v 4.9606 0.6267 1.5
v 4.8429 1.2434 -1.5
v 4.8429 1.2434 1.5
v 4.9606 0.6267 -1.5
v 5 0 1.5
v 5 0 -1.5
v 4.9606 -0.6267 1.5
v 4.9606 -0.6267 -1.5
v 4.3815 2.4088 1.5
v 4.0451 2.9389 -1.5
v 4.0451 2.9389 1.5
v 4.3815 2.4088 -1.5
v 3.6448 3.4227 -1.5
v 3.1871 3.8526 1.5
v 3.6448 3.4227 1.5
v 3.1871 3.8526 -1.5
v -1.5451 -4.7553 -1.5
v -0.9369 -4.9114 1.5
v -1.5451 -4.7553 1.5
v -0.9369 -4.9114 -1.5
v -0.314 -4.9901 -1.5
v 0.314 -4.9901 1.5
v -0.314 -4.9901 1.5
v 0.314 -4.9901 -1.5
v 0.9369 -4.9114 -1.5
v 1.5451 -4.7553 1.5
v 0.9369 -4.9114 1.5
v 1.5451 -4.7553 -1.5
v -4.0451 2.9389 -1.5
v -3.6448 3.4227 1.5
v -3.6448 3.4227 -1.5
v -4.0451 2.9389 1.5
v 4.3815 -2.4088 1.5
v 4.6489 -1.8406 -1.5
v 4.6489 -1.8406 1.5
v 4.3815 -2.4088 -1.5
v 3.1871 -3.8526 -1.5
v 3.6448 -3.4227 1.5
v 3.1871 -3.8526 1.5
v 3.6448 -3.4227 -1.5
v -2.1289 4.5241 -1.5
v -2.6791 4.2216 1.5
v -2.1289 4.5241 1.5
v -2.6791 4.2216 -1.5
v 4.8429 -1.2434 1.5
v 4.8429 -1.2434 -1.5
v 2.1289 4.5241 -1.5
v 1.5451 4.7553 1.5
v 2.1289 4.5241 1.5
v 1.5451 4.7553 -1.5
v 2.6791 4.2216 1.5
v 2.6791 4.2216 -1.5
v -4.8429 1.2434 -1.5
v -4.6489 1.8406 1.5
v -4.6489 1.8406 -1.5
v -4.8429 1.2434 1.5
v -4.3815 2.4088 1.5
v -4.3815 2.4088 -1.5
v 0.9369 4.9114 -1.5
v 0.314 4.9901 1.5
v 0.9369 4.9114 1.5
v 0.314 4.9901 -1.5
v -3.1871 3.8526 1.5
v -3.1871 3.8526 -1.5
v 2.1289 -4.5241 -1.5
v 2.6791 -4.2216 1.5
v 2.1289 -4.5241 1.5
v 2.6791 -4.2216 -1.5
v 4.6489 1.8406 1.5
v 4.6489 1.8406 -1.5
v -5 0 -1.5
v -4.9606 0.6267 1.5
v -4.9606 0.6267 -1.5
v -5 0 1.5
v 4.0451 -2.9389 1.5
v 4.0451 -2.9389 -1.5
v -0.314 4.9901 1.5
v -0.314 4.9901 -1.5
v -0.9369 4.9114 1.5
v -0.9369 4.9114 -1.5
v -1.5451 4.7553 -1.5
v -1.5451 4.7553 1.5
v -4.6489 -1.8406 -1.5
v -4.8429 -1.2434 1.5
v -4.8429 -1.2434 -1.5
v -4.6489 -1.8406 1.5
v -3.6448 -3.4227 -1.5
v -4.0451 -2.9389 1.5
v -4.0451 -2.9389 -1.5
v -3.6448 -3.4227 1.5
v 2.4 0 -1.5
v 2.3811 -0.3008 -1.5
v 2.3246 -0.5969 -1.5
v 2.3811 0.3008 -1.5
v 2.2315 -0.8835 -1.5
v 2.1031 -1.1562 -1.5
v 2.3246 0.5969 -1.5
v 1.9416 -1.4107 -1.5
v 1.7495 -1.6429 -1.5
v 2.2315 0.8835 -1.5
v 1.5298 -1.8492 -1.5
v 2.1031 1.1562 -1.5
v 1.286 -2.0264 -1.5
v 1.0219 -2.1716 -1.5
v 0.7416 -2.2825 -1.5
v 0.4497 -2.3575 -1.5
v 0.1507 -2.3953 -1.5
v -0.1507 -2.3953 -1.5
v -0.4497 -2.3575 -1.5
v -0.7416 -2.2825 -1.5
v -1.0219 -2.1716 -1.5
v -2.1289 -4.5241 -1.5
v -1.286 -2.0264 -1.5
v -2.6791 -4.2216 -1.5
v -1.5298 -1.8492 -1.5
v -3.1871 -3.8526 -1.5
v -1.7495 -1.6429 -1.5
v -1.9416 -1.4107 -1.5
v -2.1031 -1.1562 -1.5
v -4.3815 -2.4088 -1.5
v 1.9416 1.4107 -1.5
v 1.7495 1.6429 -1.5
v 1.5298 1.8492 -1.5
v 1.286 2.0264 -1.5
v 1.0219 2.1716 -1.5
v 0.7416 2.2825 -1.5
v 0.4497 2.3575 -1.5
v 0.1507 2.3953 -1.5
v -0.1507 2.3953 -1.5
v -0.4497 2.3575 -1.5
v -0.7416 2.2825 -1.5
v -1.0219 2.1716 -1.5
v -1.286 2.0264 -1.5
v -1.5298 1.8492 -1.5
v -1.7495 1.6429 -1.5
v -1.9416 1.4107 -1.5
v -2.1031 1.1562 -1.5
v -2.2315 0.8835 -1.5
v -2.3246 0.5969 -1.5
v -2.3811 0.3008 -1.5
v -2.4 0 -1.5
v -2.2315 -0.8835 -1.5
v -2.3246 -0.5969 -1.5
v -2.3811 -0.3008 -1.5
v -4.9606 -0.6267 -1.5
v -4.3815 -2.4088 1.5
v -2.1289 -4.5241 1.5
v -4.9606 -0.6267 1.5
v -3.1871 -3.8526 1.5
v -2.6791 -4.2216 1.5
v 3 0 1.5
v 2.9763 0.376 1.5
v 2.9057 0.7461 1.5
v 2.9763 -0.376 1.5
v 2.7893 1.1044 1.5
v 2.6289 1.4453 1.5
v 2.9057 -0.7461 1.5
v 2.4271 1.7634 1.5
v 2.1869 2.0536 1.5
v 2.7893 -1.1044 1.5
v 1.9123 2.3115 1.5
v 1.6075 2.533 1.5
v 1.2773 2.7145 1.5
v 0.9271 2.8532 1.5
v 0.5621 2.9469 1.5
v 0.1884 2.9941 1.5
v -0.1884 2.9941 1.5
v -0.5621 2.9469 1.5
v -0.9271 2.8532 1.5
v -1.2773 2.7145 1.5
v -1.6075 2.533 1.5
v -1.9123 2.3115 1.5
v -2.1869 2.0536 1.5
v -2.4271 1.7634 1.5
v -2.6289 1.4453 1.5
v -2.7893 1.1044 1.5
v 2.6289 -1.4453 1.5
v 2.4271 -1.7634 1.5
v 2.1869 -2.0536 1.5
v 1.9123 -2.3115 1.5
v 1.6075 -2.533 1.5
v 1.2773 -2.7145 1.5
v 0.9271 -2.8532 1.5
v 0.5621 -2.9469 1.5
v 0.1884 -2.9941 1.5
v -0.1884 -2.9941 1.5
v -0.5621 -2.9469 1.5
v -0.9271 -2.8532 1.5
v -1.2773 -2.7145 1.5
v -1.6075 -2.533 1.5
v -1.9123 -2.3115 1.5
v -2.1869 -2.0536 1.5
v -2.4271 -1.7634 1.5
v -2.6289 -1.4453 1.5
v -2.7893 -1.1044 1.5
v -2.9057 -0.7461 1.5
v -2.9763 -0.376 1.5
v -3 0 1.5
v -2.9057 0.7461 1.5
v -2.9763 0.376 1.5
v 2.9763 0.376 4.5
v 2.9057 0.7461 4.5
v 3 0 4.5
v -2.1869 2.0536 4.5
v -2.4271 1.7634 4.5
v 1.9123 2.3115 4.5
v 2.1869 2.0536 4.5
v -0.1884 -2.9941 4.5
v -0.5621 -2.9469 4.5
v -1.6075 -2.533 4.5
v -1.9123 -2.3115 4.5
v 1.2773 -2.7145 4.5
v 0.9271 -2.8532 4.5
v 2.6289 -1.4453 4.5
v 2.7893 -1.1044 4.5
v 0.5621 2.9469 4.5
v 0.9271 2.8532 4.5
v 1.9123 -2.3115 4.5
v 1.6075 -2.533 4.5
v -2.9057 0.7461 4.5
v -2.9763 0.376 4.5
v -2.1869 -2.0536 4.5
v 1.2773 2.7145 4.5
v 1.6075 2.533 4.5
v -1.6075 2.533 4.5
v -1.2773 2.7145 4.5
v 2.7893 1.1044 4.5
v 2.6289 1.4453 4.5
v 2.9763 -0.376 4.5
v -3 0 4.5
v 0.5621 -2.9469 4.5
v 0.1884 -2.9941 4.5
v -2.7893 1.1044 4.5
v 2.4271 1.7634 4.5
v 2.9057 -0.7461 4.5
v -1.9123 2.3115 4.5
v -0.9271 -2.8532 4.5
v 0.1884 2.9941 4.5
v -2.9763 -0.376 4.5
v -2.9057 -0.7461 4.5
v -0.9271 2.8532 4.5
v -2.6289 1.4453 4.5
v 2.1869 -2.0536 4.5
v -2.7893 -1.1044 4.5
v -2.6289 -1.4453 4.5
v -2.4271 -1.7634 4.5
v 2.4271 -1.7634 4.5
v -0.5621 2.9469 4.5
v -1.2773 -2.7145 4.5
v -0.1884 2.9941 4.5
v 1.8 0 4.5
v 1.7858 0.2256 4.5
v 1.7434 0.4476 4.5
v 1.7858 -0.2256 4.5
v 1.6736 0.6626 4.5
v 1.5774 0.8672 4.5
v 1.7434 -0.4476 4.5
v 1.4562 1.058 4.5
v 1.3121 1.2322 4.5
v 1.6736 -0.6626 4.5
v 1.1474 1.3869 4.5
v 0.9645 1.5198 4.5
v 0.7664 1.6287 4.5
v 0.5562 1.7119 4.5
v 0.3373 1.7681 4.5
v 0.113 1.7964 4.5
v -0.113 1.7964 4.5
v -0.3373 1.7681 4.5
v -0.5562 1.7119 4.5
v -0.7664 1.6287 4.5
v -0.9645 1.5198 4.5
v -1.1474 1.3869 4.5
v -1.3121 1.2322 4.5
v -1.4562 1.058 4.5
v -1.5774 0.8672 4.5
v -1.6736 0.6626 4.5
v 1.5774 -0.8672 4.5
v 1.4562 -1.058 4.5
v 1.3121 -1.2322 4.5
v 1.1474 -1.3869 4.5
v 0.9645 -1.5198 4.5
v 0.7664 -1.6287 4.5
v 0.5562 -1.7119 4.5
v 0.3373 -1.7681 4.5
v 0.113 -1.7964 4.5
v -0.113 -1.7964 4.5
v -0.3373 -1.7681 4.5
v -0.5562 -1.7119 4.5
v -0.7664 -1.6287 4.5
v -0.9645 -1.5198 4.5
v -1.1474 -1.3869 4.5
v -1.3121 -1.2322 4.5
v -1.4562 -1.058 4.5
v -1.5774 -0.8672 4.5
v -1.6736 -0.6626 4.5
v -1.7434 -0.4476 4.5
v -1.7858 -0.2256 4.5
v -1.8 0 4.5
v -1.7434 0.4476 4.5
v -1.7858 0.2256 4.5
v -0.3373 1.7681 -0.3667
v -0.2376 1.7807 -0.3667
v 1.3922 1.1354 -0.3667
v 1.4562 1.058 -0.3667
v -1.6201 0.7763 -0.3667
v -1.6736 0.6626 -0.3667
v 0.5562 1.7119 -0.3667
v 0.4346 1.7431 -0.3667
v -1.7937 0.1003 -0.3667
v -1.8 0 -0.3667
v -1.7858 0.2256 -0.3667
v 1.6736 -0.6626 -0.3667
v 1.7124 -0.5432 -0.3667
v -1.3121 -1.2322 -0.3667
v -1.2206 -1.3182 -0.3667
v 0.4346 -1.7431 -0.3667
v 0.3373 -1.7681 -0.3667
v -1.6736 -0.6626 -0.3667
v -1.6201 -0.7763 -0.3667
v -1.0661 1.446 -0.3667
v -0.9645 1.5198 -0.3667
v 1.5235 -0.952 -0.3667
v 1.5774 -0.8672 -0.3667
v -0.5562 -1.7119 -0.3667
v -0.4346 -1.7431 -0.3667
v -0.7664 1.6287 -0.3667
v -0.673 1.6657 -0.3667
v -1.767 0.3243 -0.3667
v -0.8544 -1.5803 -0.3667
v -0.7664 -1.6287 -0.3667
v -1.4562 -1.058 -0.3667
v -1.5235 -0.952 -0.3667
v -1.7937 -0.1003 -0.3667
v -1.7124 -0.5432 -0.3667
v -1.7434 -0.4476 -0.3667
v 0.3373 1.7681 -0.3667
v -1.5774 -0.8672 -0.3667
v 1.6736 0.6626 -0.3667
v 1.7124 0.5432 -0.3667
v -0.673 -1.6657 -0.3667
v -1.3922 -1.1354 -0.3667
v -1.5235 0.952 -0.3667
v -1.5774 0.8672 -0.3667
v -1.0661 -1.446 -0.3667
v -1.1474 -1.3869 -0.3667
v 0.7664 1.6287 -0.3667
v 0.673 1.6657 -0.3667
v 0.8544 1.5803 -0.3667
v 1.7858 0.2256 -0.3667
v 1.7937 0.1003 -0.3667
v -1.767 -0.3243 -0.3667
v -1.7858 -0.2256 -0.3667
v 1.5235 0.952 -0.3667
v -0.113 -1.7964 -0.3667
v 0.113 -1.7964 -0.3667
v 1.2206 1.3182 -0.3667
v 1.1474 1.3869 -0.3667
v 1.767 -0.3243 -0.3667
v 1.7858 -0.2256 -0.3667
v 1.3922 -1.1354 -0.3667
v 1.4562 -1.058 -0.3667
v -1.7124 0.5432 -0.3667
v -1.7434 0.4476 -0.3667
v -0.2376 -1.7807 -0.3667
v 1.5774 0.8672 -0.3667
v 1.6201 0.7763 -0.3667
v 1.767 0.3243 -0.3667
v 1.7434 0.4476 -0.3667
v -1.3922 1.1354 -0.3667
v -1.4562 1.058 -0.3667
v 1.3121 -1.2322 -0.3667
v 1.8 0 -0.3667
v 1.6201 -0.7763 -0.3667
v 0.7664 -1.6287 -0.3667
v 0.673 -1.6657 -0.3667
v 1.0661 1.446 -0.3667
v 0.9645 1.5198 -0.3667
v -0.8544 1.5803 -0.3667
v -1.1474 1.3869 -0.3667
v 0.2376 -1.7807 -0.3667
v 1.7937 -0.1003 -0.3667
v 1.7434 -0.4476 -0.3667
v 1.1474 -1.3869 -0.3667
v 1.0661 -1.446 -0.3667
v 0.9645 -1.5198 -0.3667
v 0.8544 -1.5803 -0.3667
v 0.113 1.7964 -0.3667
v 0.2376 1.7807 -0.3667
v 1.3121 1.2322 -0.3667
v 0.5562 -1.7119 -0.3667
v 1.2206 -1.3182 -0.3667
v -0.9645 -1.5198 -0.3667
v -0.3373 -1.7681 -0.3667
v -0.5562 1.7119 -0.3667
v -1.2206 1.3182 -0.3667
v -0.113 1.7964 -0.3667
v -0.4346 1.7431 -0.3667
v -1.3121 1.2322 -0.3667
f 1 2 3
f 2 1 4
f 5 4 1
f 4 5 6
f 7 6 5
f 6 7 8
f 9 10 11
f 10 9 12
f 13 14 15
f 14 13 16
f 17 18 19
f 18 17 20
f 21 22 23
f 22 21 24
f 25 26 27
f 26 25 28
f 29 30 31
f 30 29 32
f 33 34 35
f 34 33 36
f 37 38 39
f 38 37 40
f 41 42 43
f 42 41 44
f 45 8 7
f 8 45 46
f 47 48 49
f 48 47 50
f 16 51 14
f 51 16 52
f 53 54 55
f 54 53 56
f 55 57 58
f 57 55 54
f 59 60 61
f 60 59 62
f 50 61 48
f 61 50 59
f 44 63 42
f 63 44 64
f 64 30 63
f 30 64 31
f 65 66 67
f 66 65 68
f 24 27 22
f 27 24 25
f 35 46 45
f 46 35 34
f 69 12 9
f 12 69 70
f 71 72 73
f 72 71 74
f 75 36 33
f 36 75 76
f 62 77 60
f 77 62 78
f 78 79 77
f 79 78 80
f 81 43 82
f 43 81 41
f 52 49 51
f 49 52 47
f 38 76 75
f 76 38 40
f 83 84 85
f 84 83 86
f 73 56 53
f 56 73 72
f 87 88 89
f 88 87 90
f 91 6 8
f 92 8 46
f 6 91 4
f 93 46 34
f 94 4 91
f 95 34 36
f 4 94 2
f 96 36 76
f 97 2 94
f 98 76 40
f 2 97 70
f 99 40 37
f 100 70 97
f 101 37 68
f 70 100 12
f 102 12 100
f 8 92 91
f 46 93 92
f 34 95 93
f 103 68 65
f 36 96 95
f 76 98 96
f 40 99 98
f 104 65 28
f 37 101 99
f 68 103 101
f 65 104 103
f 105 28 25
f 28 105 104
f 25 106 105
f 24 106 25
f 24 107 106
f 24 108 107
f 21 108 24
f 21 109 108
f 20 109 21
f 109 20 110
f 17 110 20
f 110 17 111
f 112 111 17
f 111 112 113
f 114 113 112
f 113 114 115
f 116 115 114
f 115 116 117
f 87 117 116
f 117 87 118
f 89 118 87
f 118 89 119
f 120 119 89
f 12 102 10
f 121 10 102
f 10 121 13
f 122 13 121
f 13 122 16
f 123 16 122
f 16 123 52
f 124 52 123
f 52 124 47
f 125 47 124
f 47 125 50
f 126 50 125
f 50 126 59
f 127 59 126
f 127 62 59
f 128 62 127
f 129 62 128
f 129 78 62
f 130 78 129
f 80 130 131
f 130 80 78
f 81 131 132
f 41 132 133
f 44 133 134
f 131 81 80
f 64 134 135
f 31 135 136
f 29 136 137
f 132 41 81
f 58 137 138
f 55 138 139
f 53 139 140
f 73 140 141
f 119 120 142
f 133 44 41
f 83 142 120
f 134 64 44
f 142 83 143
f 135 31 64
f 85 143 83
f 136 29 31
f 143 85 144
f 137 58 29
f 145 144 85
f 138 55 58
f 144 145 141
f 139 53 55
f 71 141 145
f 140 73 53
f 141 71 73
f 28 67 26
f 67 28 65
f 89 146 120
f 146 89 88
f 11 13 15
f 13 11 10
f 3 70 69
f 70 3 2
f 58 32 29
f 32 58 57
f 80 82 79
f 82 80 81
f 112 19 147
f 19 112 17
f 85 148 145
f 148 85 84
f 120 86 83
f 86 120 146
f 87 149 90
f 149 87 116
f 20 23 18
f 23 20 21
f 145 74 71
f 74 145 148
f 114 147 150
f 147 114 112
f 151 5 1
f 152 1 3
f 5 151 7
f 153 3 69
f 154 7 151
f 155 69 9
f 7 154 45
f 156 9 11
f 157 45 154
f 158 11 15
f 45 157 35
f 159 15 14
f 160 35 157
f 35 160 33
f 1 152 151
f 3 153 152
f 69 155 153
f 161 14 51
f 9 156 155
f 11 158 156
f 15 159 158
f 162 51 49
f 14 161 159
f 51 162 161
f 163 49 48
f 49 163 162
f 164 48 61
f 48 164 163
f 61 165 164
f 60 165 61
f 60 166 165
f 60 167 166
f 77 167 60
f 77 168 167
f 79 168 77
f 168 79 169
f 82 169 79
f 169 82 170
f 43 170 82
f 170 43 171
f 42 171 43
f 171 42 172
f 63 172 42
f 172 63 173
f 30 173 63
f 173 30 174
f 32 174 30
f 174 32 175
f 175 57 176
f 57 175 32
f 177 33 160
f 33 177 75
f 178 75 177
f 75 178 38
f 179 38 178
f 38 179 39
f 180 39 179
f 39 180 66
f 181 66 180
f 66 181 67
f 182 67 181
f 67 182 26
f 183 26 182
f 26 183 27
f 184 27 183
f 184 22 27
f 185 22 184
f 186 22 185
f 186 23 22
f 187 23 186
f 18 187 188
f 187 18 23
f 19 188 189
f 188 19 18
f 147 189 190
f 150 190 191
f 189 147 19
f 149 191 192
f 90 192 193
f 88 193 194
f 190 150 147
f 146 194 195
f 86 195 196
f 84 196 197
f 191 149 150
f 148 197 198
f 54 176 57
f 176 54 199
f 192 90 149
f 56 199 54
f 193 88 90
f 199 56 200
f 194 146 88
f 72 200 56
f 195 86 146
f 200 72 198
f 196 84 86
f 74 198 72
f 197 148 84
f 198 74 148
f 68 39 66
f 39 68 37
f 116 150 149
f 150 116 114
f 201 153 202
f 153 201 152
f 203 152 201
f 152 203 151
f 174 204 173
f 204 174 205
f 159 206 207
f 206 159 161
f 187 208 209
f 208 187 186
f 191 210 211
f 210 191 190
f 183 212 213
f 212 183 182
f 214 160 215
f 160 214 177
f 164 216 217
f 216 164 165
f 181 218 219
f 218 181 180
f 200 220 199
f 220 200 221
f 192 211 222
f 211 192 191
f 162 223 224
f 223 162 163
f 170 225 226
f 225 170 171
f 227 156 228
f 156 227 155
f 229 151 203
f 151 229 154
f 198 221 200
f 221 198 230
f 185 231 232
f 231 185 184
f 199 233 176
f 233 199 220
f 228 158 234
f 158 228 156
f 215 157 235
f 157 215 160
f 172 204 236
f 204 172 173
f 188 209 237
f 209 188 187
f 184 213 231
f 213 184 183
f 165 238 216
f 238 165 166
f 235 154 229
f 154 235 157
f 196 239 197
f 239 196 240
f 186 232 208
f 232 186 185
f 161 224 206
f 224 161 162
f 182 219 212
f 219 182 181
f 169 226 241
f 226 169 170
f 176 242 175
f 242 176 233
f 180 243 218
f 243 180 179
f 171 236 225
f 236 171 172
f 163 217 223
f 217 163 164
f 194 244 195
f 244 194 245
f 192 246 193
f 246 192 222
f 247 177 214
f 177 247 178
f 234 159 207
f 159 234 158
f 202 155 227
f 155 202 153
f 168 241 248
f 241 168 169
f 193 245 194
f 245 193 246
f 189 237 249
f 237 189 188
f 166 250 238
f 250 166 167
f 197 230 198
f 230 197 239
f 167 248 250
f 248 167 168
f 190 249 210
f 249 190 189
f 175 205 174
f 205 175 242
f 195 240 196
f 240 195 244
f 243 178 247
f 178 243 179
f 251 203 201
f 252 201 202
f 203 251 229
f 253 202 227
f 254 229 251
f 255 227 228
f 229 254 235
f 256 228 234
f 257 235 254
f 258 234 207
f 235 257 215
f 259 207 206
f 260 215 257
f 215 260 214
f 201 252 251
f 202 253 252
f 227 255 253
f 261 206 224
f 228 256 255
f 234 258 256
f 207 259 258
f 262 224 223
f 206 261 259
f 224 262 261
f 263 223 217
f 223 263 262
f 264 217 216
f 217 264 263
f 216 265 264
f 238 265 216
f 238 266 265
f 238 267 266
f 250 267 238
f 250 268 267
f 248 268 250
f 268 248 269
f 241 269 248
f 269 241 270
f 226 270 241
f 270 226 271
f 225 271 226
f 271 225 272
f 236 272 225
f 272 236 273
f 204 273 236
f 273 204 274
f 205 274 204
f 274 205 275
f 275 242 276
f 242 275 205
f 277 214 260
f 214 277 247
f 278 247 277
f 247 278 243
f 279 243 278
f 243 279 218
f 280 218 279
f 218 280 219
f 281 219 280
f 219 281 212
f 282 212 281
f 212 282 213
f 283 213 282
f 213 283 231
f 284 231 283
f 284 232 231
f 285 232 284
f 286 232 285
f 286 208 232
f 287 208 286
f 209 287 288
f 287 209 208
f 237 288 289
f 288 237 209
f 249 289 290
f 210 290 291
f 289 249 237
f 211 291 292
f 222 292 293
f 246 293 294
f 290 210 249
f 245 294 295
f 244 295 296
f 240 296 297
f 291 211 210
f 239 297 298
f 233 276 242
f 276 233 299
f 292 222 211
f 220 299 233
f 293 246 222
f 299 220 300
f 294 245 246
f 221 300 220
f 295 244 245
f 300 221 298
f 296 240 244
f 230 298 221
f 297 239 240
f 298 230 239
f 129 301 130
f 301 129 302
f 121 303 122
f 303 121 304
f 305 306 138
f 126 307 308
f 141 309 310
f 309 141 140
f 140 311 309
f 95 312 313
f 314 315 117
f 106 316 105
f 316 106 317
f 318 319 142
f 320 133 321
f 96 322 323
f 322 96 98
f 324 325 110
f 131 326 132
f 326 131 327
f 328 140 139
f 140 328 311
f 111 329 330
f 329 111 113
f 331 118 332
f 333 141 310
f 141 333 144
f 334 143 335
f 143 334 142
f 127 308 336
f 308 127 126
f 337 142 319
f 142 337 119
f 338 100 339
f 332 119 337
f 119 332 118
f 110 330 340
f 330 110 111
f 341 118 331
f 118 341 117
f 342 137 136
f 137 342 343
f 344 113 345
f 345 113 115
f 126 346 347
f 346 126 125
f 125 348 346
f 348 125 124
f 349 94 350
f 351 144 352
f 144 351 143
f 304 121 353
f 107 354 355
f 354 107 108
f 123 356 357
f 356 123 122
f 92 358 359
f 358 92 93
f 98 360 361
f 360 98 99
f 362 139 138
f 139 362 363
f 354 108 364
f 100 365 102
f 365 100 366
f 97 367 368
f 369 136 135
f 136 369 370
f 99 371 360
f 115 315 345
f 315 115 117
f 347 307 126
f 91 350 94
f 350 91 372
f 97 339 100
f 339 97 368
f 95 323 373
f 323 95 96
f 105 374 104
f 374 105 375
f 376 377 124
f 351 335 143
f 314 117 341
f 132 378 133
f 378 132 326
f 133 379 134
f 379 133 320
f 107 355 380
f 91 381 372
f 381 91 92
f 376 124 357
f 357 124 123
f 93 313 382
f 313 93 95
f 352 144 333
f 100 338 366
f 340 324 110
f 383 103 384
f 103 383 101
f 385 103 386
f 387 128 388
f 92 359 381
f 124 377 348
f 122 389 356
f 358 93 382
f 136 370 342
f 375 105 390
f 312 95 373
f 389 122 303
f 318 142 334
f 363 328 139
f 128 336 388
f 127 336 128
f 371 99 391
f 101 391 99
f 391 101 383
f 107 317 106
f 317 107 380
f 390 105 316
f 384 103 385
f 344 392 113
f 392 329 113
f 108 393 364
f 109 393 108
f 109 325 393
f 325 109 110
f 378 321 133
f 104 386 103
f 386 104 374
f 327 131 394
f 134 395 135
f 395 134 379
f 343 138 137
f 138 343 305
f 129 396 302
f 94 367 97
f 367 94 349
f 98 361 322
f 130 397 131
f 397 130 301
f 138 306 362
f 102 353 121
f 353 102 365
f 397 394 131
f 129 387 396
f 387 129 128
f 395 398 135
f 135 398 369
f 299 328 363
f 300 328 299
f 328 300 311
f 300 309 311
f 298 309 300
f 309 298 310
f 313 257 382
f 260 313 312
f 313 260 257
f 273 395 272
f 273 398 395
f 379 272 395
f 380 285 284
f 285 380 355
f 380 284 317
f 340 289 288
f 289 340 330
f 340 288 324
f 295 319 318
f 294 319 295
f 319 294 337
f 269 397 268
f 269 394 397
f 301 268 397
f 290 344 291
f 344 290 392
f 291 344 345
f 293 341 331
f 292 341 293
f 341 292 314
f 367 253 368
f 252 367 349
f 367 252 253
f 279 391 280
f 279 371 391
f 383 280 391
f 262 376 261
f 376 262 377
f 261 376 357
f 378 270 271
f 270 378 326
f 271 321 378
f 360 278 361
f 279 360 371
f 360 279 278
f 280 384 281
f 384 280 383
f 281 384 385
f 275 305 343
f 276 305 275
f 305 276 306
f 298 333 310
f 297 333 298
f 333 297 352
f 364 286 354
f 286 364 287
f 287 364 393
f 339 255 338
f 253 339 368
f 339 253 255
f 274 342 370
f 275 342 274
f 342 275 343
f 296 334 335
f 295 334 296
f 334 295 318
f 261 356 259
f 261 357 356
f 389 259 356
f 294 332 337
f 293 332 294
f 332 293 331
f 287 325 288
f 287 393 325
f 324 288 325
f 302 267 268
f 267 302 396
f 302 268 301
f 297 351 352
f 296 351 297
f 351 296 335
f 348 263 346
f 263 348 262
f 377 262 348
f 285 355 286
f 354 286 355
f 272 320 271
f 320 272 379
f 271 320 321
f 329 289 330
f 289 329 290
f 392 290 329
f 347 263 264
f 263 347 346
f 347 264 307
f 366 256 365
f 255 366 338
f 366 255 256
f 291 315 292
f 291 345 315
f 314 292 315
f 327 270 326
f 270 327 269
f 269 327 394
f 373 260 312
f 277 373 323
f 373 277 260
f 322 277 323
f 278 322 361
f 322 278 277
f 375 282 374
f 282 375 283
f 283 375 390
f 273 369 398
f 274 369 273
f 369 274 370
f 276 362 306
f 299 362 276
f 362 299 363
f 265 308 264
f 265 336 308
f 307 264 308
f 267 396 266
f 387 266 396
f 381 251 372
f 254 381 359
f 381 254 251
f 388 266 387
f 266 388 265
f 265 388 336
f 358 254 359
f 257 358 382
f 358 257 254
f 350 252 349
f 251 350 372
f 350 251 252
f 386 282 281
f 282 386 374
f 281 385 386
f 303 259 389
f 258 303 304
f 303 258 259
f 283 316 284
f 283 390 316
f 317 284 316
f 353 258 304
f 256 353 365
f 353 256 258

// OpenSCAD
$fn = 50;


difference() {
	union() {
		translate(v = [0, 0, -1.5000000000]) {
			cylinder(h = 3, r = 5.0000000000);
		}
		translate(v = [0, 0, -1.5000000000]) {
			cylinder(h = 6, r = 3.0000000000);
		}
	}
	union() {
		translate(v = [0, 0, -1.5000000000]) {
			rotate(a = [0, 180, 0]) {
				difference() {
					union() {
						translate(v = [0, 0, -1.7000000000]) {
							cylinder(h = 1.7000000000, r1 = 1.5000000000, r2 = 2.4000000000);
						}
						translate(v = [0, 0, -6.0000000000]) {
							cylinder(h = 6, r = 1.5000000000);
						}
						translate(v = [0, 0, -6.0000000000]) {
							cylinder(h = 6, r = 1.8000000000);
						}
						translate(v = [0, 0, -6.0000000000]) {
							cylinder(h = 6, r = 1.5000000000);
						}
					}
					union();
				}
			}
		}
		translate(v = [0, 0, -50.0000000000]) {
			cylinder(h = 100, r = 1.5000000000);
		}
	}
}
